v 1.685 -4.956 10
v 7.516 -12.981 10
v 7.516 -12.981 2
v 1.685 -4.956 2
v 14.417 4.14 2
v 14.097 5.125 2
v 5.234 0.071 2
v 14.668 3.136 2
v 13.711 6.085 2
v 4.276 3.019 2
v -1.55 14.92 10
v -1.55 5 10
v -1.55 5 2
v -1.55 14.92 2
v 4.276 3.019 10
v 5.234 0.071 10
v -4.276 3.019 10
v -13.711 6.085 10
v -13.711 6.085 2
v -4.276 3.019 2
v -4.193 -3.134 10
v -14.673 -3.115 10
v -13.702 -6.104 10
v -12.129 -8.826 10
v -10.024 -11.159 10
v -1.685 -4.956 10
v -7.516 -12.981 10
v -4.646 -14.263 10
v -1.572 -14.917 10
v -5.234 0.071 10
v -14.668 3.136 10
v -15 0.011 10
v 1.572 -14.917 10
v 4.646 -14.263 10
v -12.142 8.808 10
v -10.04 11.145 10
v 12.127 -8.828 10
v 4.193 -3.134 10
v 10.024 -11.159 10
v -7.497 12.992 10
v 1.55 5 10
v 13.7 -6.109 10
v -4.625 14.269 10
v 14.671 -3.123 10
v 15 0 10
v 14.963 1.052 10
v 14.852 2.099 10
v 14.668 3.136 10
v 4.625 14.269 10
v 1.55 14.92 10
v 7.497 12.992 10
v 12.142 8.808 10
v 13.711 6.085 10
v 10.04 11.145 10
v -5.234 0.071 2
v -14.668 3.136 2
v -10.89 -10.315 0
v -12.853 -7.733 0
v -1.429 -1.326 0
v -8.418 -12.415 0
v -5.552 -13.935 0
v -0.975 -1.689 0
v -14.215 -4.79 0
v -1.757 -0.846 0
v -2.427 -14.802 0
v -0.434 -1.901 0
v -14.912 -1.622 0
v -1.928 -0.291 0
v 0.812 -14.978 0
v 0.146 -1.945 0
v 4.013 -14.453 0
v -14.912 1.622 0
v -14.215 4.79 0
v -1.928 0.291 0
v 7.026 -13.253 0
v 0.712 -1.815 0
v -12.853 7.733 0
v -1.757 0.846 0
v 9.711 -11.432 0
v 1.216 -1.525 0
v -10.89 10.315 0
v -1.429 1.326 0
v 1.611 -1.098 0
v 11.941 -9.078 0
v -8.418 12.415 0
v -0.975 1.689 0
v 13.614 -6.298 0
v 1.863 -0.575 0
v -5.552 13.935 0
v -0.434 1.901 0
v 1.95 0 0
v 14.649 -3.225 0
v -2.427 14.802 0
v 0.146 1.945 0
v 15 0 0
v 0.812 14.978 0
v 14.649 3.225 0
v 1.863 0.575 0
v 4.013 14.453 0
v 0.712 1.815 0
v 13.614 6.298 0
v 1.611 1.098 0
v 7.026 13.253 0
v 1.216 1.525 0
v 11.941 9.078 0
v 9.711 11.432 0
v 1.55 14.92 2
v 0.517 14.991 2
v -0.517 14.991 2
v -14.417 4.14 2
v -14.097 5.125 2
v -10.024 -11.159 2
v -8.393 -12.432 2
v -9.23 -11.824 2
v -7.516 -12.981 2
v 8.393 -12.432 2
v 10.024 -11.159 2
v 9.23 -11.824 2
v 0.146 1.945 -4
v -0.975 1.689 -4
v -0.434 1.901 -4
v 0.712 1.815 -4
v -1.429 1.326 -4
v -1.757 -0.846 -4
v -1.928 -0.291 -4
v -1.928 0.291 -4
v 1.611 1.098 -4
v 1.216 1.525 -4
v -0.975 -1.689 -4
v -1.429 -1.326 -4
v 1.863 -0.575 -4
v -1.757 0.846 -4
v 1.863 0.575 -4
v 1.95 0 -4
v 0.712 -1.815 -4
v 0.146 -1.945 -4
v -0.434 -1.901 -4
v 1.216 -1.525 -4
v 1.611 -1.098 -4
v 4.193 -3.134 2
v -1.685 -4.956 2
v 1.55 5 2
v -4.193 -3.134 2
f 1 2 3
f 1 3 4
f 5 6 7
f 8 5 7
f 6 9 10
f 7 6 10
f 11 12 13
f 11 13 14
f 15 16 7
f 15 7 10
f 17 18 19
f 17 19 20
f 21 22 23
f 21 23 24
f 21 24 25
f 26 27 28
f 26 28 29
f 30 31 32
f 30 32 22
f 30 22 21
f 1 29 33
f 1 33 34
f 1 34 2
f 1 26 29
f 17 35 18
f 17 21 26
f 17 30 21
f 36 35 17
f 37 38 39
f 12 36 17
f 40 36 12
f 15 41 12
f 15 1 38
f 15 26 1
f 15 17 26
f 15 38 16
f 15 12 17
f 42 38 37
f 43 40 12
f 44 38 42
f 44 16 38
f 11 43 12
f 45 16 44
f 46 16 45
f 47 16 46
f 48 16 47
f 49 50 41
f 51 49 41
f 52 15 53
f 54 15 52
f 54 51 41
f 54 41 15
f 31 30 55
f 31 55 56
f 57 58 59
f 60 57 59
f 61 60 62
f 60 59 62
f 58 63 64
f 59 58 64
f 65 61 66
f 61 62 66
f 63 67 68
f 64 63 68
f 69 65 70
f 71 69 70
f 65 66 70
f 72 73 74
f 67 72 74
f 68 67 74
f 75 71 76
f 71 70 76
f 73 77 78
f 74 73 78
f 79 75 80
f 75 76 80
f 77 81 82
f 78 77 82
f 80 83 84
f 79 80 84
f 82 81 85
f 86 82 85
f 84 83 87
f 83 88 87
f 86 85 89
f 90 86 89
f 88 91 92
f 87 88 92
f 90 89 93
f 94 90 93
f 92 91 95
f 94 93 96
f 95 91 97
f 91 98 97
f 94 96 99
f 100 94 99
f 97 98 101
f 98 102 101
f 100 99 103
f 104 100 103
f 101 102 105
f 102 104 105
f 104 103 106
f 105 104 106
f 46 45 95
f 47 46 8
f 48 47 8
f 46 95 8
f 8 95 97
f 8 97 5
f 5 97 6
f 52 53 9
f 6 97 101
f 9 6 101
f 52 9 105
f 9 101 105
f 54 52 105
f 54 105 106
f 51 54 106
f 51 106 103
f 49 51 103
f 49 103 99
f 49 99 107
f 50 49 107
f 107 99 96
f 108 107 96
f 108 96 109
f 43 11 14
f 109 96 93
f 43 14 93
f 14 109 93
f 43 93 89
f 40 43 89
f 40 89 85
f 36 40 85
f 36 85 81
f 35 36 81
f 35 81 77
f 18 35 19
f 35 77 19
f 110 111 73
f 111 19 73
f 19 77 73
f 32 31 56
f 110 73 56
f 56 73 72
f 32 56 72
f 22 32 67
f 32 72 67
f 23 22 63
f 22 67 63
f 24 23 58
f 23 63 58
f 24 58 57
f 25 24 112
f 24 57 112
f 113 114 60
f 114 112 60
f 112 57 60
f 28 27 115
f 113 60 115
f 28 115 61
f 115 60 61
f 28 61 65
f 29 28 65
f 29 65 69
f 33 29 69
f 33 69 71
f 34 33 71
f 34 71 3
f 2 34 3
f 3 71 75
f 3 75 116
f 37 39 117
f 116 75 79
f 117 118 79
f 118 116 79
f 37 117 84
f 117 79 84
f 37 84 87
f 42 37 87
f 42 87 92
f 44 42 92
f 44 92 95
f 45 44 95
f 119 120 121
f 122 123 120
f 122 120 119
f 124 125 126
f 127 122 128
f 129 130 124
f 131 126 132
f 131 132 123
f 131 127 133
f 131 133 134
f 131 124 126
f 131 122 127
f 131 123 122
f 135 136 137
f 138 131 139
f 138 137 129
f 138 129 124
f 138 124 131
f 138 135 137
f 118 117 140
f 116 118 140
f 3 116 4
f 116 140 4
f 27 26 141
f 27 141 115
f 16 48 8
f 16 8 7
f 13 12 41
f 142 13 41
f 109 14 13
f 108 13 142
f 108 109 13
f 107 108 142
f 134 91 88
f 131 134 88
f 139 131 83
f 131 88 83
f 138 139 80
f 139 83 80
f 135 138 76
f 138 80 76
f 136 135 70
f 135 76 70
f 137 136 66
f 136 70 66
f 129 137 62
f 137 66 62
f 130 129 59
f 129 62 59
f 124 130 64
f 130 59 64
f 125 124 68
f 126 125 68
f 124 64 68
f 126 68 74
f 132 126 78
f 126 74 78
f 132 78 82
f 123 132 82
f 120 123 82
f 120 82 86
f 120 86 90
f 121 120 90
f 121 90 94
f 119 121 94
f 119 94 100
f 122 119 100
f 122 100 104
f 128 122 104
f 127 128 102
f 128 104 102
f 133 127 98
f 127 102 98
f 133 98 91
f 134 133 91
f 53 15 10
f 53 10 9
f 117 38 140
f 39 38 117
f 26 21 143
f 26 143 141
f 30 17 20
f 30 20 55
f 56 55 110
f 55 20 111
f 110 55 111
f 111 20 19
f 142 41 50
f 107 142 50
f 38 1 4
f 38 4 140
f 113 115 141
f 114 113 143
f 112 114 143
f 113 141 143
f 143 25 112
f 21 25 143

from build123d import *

# Parameters (mm, degrees)
SKETCH_1_R          = 15
EXTRUDE_1_DEPTH     = 10
SKETCH_2_R          = 1.95
EXTRUDE_2_DEPTH     = 4
SKETCH_3_W          = 3.1
SKETCH_3_H          = 25.258877381
CUT_EXTRUDE_1_DEPTH = 8


with BuildPart() as part:
    # 草图1 → 凸台-拉伸1 (new body)
    with BuildSketch(Plane.XY):
        Circle(SKETCH_1_R)
    extrude(amount=EXTRUDE_1_DEPTH)

    # 草图2 → 凸台-拉伸2 (add)
    with BuildSketch(Plane(origin=(0, 0, 0), x_dir=(-1, 0, 0), z_dir=(0, 0, -1))):
        Circle(SKETCH_2_R)
    extrude(amount=EXTRUDE_2_DEPTH)

    # 草图3 → 切除-拉伸1 (cut)
    with BuildSketch(Plane.XY.offset(10)):
        Polygon((29.256878851, 7.876369741), (5.234258923, 0.070947372), (4.27630624, 3.019222572), (28.298926168, 10.824644942), align=None)
        with Locations((0, 17.629438691)):
            Rectangle(SKETCH_3_W, SKETCH_3_H)
        Polygon((16.531745534, -25.391013173), (1.68494992, -4.956152113), (4.192902603, -3.134017831), (19.039698217, -23.568878891), align=None)
        Polygon((-19.039698217, -23.568878891), (-4.192902603, -3.134017831), (-1.68494992, -4.956152113), (-16.531745534, -25.391013173), align=None)
        Polygon((-28.298926168, 10.824644942), (-4.27630624, 3.019222572), (-5.234258923, 0.070947372), (-29.256878851, 7.876369741), align=None)
    extrude(amount=-CUT_EXTRUDE_1_DEPTH, mode=Mode.SUBTRACT)


solid = part.part
